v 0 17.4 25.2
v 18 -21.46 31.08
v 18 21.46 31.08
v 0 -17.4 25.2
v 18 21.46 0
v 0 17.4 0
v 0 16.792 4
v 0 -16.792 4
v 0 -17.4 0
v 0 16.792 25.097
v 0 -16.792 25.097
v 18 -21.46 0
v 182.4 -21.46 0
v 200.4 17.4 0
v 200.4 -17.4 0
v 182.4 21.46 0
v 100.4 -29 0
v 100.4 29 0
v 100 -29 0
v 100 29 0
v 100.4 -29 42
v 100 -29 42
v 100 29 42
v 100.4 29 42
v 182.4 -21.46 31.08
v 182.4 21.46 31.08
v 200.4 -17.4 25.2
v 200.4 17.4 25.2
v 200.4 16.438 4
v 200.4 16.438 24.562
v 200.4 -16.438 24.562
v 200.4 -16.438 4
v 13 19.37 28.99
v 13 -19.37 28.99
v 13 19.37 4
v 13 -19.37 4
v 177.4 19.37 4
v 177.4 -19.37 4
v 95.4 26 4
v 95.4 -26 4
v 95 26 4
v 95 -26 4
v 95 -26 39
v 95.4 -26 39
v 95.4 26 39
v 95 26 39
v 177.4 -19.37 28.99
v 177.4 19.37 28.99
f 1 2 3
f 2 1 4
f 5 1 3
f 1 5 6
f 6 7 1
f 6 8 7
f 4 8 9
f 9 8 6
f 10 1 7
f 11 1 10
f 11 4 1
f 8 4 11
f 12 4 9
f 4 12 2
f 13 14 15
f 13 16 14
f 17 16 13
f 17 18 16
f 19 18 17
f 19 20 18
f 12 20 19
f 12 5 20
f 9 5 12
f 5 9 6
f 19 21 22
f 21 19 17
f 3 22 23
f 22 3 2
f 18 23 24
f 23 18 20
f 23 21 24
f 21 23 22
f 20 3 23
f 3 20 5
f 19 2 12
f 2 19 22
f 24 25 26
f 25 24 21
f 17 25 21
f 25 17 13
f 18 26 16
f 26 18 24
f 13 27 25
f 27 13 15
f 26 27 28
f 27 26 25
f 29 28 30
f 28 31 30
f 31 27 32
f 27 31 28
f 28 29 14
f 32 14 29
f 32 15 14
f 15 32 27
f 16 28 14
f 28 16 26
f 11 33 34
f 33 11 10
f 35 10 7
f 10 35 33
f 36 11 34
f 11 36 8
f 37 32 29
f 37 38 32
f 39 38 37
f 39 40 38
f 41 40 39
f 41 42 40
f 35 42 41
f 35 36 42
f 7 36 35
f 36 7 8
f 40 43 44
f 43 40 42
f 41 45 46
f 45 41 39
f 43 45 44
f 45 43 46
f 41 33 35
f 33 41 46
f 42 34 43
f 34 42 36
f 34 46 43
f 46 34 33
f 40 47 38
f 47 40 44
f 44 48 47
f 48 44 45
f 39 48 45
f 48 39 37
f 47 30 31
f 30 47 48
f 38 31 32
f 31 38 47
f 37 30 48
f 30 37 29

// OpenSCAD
$fn = 32;

// ----------------------------------------------------------------------
// Faired channel: 200 x 58 x 42 mm, 3 mm walls, faired ends
// ----------------------------------------------------------------------

// --- parameters (mm) ---
length = 200;             // channel length
width = 58;               // channel width at mid length
height = 42;              // channel height at mid length
wall = 3;                 // side wall thickness
floor_t = 4;              // floor thickness
end_w = 34.8;             // faired end width
end_h = 25.2;             // faired end height

difference() {
  union() {
    hull() {
      translate([0, -17.4, 0]) cube([0.4, 34.8, 25.2]);
      translate([18, -21.46, 0]) cube([0.4, 42.92, 31.08]);
    }
    hull() {
      translate([18, -21.46, 0]) cube([0.4, 42.92, 31.08]);
      translate([100, -29, 0]) cube([0.4, 58, 42]);
    }
    hull() {
      translate([100, -29, 0]) cube([0.4, 58, 42]);
      translate([182, -21.46, 0]) cube([0.4, 42.92, 31.08]);
    }
    hull() {
      translate([182, -21.46, 0]) cube([0.4, 42.92, 31.08]);
      translate([200, -17.4, 0]) cube([0.4, 34.8, 25.2]);
    }
  }
  /* cavity, 5 mm proud of both ends so the ports are cut clean */
  hull() {
    translate([-5, -15.8, 4]) cube([0.4, 31.6, 19.6]);
    translate([13, -19.37, 4]) cube([0.4, 38.74, 24.99]);
  }
  hull() {
    translate([13, -19.37, 4]) cube([0.4, 38.74, 24.99]);
    translate([95, -26, 4]) cube([0.4, 52, 35]);
  }
  hull() {
    translate([95, -26, 4]) cube([0.4, 52, 35]);
    translate([177, -19.37, 4]) cube([0.4, 38.74, 24.99]);
  }
  hull() {
    translate([177, -19.37, 4]) cube([0.4, 38.74, 24.99]);
    translate([205, -15.8, 4]) cube([0.4, 31.6, 19.6]);
  }
}
